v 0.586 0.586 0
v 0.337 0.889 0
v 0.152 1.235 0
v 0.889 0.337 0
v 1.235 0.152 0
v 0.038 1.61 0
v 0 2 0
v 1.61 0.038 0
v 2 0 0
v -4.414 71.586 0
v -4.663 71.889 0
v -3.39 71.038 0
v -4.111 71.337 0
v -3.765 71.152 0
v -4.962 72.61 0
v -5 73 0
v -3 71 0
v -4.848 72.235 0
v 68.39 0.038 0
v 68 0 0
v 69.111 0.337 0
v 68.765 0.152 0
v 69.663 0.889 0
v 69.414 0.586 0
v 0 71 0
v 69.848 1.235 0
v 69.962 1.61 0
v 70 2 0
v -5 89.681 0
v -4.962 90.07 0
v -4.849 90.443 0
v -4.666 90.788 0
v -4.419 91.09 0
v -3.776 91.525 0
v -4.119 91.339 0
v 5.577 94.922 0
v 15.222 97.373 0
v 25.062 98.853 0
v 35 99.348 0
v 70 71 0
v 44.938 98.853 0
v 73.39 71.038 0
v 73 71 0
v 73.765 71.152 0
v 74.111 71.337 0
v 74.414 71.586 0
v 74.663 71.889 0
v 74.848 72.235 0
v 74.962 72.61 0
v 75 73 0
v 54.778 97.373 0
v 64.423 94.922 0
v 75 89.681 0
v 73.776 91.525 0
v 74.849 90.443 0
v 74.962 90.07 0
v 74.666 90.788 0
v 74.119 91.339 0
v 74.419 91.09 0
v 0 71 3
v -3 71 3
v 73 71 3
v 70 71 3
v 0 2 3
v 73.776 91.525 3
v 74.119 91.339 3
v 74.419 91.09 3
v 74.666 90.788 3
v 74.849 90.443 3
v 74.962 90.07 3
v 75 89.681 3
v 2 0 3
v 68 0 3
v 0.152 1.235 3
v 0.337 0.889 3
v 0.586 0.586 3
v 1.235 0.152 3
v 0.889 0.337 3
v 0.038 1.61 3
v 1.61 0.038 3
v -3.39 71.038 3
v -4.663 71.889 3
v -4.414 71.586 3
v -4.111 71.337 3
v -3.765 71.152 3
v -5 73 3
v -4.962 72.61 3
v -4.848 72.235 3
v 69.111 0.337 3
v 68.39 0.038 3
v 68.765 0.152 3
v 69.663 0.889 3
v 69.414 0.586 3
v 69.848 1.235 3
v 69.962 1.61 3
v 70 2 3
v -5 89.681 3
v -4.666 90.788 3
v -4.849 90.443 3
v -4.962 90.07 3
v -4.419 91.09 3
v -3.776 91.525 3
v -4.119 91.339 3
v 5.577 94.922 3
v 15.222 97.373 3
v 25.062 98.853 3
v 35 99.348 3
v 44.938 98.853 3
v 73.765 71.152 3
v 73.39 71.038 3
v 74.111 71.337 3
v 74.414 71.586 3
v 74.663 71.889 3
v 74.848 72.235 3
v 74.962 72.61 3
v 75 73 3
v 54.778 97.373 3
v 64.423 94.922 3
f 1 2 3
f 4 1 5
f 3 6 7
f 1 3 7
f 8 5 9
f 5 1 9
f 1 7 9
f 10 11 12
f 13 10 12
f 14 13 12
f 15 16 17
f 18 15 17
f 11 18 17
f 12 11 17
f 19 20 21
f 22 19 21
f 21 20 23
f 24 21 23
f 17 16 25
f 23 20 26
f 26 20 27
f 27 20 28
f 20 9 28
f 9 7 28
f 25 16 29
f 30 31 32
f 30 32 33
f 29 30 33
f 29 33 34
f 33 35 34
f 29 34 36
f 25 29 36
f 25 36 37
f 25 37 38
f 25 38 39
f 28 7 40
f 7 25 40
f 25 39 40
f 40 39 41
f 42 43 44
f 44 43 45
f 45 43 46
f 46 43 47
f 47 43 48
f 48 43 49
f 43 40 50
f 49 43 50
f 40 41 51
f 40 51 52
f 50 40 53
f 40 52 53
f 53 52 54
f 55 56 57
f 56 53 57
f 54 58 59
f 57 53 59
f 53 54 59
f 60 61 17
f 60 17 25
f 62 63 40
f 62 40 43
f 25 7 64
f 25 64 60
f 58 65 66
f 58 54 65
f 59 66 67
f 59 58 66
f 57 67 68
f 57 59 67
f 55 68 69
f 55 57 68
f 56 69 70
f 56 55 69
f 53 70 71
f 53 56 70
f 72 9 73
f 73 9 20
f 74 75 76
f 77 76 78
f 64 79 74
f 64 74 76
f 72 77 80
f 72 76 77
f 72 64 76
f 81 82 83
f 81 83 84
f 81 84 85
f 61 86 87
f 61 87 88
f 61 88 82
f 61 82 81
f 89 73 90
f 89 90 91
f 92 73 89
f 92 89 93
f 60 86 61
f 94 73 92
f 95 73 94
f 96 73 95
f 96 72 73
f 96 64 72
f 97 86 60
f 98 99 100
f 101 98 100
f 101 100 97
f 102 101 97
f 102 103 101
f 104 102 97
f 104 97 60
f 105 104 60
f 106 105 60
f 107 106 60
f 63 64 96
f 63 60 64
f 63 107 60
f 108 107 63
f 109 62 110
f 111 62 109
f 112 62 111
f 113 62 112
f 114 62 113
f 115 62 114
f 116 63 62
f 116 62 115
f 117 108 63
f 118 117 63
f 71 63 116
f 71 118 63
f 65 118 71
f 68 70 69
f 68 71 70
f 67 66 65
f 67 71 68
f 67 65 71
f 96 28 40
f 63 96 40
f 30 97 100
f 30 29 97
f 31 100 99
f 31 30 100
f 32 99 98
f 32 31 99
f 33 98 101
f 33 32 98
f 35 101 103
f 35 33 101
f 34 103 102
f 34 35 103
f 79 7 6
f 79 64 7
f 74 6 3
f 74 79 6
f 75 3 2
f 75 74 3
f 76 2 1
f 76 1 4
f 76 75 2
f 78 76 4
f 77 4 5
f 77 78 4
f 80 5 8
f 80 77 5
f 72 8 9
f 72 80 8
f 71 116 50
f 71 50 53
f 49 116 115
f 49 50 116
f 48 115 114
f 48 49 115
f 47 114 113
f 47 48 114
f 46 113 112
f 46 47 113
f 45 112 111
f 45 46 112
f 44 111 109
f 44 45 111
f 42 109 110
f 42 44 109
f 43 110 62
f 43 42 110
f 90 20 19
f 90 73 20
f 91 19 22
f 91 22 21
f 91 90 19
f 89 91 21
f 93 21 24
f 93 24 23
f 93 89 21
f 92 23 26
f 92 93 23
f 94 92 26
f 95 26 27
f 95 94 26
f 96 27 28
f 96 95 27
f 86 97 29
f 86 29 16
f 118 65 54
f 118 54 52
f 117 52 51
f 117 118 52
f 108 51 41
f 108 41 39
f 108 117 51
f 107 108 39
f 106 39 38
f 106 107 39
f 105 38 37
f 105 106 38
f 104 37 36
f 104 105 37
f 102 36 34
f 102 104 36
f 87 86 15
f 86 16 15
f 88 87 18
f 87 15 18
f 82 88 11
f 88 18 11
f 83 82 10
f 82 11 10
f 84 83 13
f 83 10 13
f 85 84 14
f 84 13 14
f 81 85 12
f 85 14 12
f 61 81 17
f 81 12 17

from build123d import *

# Parameters (mm, degrees)
ESQUISSE1_W        = 70
ESQUISSE1_H        = 71
BOSS_EXTRU_1_DEPTH = 3
BOSS_EXTRU_2_DEPTH = 3
CONG_1_R           = 2


with BuildPart() as part:
    # Esquisse1 → Boss.-Extru.1 (new body)
    with BuildSketch(Plane.XY):
        with Locations((35, 35.5)):
            Rectangle(ESQUISSE1_W, ESQUISSE1_H)
    extrude(amount=BOSS_EXTRU_1_DEPTH)

    # Esquisse2 → Boss.-Extru.2 (add)
    with BuildSketch(Plane.XY.offset(3)):
        with BuildLine():
            Line((-5, 91), (-5, 71))
            Line((-5, 71), (75, 71))
            Line((75, 71), (75, 91))
            ThreePointArc((75, 91), (35, 99.348486101), (-5, 91))
        make_face()
    extrude(amount=-BOSS_EXTRU_2_DEPTH)

    # Congé1
    cong_1_edges = [part.edges().sort_by_distance(p)[0] for p in [
        (-5, 91, 1.5),
        (75, 91, 1.5),
        (75, 71, 1.5),
        (-5, 71, 1.5),
        (70, 0, 1.5),
        (0, 0, 1.5),
    ]]
    fillet(cong_1_edges, radius=CONG_1_R)


solid = part.part
